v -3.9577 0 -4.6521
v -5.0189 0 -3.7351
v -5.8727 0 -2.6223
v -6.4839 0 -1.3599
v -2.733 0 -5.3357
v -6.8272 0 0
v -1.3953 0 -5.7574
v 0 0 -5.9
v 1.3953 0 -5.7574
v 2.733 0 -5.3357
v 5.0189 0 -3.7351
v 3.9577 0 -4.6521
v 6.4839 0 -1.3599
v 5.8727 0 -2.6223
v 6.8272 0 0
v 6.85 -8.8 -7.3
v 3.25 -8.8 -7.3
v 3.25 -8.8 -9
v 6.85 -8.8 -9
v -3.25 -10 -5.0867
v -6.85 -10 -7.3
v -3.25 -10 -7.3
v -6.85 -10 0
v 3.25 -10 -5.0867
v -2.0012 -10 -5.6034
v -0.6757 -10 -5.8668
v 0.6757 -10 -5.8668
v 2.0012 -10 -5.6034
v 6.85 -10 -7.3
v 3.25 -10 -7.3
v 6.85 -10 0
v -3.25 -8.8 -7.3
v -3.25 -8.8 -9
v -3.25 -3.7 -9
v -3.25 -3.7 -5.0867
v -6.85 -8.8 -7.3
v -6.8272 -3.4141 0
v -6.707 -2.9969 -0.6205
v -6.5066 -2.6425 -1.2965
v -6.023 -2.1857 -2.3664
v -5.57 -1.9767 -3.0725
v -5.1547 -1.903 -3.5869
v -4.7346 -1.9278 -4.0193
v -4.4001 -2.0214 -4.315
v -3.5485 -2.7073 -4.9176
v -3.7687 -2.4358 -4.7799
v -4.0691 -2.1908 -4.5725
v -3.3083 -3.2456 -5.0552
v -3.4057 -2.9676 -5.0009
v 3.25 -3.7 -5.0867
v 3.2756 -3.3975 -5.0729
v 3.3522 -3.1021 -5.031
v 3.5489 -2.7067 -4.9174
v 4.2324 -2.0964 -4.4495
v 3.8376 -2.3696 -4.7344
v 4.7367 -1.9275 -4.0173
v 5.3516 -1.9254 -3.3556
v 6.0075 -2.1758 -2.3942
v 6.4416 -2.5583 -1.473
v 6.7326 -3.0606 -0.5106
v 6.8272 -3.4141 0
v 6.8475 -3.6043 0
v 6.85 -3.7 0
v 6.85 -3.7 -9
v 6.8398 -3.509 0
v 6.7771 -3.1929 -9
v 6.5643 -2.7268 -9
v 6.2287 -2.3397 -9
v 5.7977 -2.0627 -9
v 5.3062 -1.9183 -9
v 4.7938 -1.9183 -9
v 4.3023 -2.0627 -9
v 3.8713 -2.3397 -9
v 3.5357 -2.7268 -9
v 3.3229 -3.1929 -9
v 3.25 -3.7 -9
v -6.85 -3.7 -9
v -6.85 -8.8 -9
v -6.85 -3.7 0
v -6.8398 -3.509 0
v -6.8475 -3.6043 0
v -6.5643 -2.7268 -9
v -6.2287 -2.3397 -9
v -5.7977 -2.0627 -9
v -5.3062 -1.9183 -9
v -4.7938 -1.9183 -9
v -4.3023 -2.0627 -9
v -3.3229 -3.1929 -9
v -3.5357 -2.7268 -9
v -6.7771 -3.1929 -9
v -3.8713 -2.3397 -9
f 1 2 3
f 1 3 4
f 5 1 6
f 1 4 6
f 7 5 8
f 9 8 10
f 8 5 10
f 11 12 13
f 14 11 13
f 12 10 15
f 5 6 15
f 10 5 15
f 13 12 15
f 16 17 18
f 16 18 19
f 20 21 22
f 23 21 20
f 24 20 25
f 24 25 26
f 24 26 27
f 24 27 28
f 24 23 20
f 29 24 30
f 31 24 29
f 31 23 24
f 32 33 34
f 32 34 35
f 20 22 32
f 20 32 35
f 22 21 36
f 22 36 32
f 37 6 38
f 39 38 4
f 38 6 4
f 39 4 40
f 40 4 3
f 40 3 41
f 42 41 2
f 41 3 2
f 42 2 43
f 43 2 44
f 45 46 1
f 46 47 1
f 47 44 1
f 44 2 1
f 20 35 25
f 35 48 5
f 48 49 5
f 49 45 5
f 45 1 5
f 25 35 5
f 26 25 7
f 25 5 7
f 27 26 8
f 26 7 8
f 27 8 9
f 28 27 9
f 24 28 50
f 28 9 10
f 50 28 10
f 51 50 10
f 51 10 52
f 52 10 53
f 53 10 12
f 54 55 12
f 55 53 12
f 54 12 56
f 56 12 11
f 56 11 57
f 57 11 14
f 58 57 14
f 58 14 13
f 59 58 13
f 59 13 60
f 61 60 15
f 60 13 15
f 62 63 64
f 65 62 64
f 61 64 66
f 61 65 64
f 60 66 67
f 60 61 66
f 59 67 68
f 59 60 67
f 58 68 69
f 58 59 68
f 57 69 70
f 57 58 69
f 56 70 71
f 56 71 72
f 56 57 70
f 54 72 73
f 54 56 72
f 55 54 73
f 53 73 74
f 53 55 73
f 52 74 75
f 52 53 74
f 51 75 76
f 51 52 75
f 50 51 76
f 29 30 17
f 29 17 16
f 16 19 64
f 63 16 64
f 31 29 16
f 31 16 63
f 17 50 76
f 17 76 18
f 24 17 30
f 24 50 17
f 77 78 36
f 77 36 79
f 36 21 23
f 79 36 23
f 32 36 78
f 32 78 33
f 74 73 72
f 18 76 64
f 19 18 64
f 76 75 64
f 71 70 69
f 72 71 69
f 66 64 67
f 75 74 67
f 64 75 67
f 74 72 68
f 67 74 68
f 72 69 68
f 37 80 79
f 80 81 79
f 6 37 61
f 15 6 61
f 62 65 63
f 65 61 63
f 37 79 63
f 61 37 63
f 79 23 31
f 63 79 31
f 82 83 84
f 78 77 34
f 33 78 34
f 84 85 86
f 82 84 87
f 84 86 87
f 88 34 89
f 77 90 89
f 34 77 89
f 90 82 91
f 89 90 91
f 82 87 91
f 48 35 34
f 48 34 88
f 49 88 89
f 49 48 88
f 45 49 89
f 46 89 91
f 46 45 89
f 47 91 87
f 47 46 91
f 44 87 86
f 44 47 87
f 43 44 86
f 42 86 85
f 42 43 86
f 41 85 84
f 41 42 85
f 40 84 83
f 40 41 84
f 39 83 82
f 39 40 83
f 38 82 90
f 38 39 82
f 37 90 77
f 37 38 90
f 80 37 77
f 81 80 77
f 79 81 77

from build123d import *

# Parameters (mm, degrees)
PAD_DEPTH       = 10
POCKET_DEPTH    = 9
POCKET001_DEPTH = 1.2
SKETCH009_W     = 13.7
SKETCH009_H     = 10
PAD001_DEPTH    = 10


with BuildPart() as schienenauflage:
    # Sketch → Pad (new body)
    with BuildSketch(Plane.XZ):
        with BuildLine():
            ThreePointArc((-6.827152, 0), (0, -5.9), (6.827152, 0))
            Line((8, 0), (6.827152, 0))
            Line((8, -10), (8, 0))
            Line((-8, -10), (8, -10))
            Line((-8, 0), (-8, -10))
            Line((-6.827152, 0), (-8, 0))
        make_face()
    extrude(amount=PAD_DEPTH)

    # Sketch007 → Pocket (cut)
    with BuildSketch(Plane.XY):
        with BuildLine():
            Line((-6.85, -3.7), (-6.85, -8.8))
            Line((-6.85, -8.8), (-3.25, -8.8))
            Line((-3.25, -8.8), (-3.25, -3.7))
            ThreePointArc((-3.25, -3.7), (-5.05, -1.9), (-6.85, -3.7))
        make_face()
        with BuildLine():
            Line((3.25, -3.7), (3.25, -8.8))
            Line((3.25, -8.8), (6.85, -8.8))
            Line((6.85, -8.8), (6.85, -3.7))
            ThreePointArc((6.85, -3.7), (5.05, -1.9), (3.25, -3.7))
        make_face()
    extrude(amount=-POCKET_DEPTH, mode=Mode.SUBTRACT)

    # Sketch008 (on Face7 of Pocket) → Pocket001 (cut)
    with BuildSketch(Plane.XZ.offset(10)):
        Polygon((-6.85, 0), (-6.85, -7.3), (-3.25, -7.3), (-3.25, -2), (3.25, -2), (3.25, -7.3), (6.85, -7.3), (6.85, 0), align=None)
    extrude(amount=-POCKET001_DEPTH, mode=Mode.SUBTRACT)


with BuildPart() as body001:
    # Sketch009 (on ShapeBinder) → Pad001 (new body)
    with BuildSketch(Plane.XZ.offset(10)):
        with Locations((0, -5)):
            Rectangle(SKETCH009_W, SKETCH009_H)
    extrude(amount=-PAD001_DEPTH)

    # Boolean: cut Schienenauflage
    add(schienenauflage.part, mode=Mode.SUBTRACT)


solid = body001.part
